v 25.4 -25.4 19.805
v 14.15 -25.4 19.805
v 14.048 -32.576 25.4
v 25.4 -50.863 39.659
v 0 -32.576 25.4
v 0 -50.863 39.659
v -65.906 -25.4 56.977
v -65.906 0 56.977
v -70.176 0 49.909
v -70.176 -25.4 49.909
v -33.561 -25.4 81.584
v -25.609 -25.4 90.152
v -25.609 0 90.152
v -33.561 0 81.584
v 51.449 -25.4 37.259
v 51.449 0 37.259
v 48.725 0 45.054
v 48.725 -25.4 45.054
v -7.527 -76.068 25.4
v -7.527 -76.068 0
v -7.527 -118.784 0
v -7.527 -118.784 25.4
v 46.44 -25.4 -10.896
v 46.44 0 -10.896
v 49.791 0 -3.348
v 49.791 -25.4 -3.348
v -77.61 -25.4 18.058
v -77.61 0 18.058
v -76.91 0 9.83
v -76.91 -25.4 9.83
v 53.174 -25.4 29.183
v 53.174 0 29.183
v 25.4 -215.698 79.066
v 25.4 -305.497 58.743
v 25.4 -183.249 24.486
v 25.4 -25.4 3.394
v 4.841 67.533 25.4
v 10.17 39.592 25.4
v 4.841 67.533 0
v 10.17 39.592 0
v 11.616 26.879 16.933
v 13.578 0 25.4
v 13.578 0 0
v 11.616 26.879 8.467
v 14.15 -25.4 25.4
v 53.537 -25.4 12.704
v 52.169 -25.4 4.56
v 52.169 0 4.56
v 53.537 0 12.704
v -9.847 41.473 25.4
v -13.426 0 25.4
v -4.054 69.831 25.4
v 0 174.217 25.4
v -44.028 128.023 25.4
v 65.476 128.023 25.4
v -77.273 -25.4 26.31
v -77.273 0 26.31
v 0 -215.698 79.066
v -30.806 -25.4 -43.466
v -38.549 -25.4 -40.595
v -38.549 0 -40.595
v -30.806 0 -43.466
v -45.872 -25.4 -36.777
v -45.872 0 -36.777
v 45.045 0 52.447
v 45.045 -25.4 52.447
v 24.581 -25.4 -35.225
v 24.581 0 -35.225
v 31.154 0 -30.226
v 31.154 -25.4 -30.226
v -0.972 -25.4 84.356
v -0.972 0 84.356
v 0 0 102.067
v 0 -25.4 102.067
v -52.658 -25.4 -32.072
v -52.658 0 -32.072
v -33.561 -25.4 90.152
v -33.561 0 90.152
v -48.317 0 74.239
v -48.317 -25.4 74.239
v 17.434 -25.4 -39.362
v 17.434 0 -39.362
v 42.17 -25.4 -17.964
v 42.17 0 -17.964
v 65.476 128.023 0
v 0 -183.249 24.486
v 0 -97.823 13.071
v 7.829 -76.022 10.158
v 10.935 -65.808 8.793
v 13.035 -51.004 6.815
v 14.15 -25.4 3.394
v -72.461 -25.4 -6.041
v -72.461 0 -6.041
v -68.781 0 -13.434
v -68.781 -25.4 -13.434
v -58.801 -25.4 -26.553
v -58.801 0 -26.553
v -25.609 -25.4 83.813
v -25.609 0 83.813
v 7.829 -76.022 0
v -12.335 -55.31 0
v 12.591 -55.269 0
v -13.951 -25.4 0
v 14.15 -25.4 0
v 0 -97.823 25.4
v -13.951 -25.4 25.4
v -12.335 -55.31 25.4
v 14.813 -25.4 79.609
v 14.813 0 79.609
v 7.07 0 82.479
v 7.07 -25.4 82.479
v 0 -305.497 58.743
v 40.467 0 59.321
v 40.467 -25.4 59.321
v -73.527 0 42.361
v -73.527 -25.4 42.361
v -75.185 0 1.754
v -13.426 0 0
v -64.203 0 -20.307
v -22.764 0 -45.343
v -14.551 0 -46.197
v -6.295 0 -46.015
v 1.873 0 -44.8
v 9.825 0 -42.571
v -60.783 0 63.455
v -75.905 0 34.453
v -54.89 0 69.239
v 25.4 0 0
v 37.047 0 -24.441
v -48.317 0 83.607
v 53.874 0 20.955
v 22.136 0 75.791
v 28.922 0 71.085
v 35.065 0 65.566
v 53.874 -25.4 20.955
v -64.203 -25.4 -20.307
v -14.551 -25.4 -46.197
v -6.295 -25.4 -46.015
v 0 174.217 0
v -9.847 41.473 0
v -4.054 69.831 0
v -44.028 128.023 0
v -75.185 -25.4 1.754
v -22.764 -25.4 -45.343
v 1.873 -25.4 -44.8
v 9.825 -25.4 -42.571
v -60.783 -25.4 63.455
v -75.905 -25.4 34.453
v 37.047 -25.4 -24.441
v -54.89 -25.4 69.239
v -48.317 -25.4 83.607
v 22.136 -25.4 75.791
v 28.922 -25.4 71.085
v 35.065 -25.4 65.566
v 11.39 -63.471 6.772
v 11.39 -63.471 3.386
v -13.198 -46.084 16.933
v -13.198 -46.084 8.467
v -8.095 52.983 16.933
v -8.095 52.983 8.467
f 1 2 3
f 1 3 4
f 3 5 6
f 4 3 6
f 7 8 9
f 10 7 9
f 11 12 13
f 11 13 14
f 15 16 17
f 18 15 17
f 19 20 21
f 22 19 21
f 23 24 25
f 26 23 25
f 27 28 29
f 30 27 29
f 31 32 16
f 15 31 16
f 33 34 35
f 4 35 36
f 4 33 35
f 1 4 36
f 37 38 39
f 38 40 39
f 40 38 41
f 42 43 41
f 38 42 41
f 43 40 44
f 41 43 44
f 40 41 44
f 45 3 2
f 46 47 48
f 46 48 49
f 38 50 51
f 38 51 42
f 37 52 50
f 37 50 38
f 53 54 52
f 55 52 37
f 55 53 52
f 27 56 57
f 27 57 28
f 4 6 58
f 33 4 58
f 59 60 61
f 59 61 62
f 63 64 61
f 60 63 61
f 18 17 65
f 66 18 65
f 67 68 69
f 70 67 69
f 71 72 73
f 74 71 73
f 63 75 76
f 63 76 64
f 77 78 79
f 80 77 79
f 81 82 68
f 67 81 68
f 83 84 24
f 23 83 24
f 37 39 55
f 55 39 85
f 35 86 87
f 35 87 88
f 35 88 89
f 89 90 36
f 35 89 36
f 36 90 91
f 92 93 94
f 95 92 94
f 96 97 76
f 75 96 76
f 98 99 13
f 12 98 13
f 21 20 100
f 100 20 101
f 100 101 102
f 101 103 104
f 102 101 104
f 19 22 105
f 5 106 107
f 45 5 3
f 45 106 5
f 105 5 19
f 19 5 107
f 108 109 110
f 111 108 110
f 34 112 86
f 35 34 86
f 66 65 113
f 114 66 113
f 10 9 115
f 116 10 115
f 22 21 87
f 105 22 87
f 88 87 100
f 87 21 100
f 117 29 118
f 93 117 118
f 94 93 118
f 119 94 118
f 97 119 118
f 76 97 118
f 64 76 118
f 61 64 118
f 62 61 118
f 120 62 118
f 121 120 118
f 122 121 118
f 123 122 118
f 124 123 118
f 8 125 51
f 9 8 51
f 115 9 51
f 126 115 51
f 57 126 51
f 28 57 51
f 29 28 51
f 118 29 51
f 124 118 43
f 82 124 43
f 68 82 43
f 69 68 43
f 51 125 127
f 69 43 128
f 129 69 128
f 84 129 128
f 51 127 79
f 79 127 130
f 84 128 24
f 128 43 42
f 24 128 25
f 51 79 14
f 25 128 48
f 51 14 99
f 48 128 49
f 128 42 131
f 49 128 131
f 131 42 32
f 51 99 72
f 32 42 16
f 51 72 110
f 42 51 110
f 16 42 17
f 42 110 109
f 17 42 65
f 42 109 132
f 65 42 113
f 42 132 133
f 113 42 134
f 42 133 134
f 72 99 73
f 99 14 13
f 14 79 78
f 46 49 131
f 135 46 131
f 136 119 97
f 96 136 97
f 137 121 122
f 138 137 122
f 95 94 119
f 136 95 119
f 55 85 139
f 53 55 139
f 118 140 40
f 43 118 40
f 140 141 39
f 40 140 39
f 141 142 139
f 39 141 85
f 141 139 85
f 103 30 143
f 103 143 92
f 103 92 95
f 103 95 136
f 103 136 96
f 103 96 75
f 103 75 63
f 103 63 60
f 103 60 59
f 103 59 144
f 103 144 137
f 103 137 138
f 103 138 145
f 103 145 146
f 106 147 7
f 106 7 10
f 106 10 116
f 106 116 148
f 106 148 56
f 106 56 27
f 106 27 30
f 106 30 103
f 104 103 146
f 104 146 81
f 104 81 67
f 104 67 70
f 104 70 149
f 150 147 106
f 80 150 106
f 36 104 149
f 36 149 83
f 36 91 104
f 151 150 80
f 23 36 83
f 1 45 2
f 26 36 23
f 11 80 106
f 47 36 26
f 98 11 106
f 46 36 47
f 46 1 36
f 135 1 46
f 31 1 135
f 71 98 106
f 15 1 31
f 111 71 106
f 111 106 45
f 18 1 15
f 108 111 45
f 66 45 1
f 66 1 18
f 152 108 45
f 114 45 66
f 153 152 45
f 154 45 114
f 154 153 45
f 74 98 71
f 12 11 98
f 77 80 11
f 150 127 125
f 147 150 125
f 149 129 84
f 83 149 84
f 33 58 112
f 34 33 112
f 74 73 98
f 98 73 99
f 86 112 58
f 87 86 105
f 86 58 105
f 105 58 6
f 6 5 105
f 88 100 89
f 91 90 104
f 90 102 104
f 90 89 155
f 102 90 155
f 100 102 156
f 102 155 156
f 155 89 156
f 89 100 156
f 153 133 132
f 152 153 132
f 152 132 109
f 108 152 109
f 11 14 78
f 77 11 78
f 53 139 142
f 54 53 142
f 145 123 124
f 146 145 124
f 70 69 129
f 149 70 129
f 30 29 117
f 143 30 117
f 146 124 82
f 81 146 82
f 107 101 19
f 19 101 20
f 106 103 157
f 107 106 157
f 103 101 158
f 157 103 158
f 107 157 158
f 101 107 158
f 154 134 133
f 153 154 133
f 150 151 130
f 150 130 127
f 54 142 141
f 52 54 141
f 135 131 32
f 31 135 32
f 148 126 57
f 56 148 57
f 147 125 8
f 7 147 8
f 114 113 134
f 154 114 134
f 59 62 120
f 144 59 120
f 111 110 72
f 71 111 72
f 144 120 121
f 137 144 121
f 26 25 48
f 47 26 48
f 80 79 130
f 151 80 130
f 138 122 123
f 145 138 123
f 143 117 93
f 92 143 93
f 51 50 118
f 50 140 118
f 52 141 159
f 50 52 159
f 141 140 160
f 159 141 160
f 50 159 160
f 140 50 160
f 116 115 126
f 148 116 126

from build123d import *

# Parameters (mm, degrees)
F1_DEPTH = 25.4
F3_DEPTH = 25.4
F5_DEPTH = 25.4


with BuildPart() as f1:
    # F0 (on Top) → F1 (new body)
    with BuildSketch(Plane.XY):
        with BuildLine():
            add(Edge.make_bspline(
                [(4.8407731435, 67.5330671062), (3.2844063816, 72.5791703322), (1.6407490349, 75.497781723), (0, 75.4938647151)],
                knots=[0.9332536986, 0.9332536986, 0.9332536986, 0.9332536986, 1, 1, 1, 1], degree=3))
            add(Edge.make_bspline(
                [(0, 75.4938647151), (-1.3704474219, 75.4905930061), (-2.7388658469, 73.4484060128), (-4.0536261968, 69.8308353891)],
                knots=[0, 0, 0, 0, 0.0557503279, 0.0557503279, 0.0557503279, 0.0557503279], degree=3))
            add(Edge.make_bspline(
                [(-4.0536261968, 69.8308353891), (-12.9127091312, 45.455018016), (-19.3355556664, -50.4479074799), (-7.5271204114, -76.0682523251)],
                knots=[0.0557503279, 0.0557503279, 0.0557503279, 0.0557503279, 0.4314056924, 0.4314056924, 0.4314056924, 0.4314056924], degree=3))
            add(Edge.make_bspline(
                [(-7.5271204114, -76.0682523251), (-3.2133106681, -85.4277729417), (3.5335683384, -85.4076795144), (7.8285336494, -76.0217905045)],
                knots=[0.4314056924, 0.4314056924, 0.4314056924, 0.4314056924, 0.5686385887, 0.5686385887, 0.5686385887, 0.5686385887], degree=3))
            add(Edge.make_bspline(
                [(7.8285336494, -76.0217905045), (19.2398591449, -51.0843517129), (13.3427399346, 39.9677122684), (4.8407731435, 67.5330671062)],
                knots=[0.5686385887, 0.5686385887, 0.5686385887, 0.5686385887, 0.9332536986, 0.9332536986, 0.9332536986, 0.9332536986], degree=3))
        make_face()
        with BuildLine():
            add(Edge.make_bspline(
                [(0, 75.4938647151), (-1.3704474219, 75.4905930061), (-2.7388658469, 73.4484060128), (-4.0536261968, 69.8308353891)],
                knots=[0, 0, 0, 0, 0.0557503279, 0.0557503279, 0.0557503279, 0.0557503279], degree=3))
            add(Edge.make_bspline(
                [(4.8407731435, 67.5330671062), (3.2844063816, 72.5791703322), (1.6407490349, 75.497781723), (0, 75.4938647151)],
                knots=[0.9332536986, 0.9332536986, 0.9332536986, 0.9332536986, 1, 1, 1, 1], degree=3))
            Line((4.8407731435, 67.5330671062), (10.3095113427, 128.0233865251))
            Line((10.3095113427, 128.0233865251), (-4.0536261968, 69.8308353891))
        make_face()
        Polygon((-44.0284609795, 128.0233865251), (-4.0536261968, 69.8308353891), (10.3095113427, 128.0233865251), align=None)
        Polygon((10.3095113427, 128.0233865251), (4.8407731435, 67.5330671062), (65.4755681753, 128.0233865251), align=None)
        with BuildLine():
            add(Edge.make_bspline(
                [(-7.5271204114, -76.0682523251), (-3.2133106681, -85.4277729417), (3.5335683384, -85.4076795144), (7.8285336494, -76.0217905045)],
                knots=[0.4314056924, 0.4314056924, 0.4314056924, 0.4314056924, 0.5686385887, 0.5686385887, 0.5686385887, 0.5686385887], degree=3))
            Line((-7.5271204114, -76.0682523251), (-7.5271204114, -118.7840104103))
            Line((-7.5271204114, -118.7840104103), (7.8285336494, -76.0217905045))
        make_face()
        Polygon((-44.0284609795, 128.0233865251), (10.3095113427, 128.0233865251), (65.4755681753, 128.0233865251), (0, 174.2165982723), align=None)
    extrude(amount=F1_DEPTH)

    # F2 (on Front) → F3 (join)
    with BuildSketch(Plane.XZ):
        Polygon((35.0647498421, 65.5660423193), (28.9218947291, 71.0850805044), (22.1357589616, 75.7906955304), (14.8133639544, 79.6086770372), (7.070188251, 82.4788131758), (-0.9716536423, 84.3558401847), (-9.1853370747, 85.2101562267), (-17.441327352, 85.0282882275), (-25.6094225756, 83.8131043541), (-33.5608070045, 81.583768782), (-41.1700825562, 78.375439465), (-48.3172464097, 74.2387136729), (-54.8895835217, 69.2388300428), (-60.7834442096, 63.4546397261), (-65.9058787697, 56.9773628595), (-70.1761033488, 49.9091499686), (-73.5267739546, 42.3614709929), (-75.9050485099, 34.4533573387), (-77.2734202043, 26.3095246824), (-77.6103089988, 18.0584061299), (-76.9104019558, 9.8301267496), (-75.1847370275, 1.7544514229), (-72.4605289807, -6.0412616263), (-68.7807402035, -13.4340693463), (-64.2034031634, -20.307382743), (-58.8007051997, -26.5528055582), (-52.6578500867, -32.0718437433), (-45.8717143191, -36.7774587693), (-38.5493193119, -40.5954402761), (-30.8061436085, -43.4655764147), (-22.7643017153, -45.3426034236), (-14.5506182828, -46.1969194657), (-6.2946280055, -46.0150514664), (1.8734672181, -44.799867593), (9.8248516469, -42.5705320209), (17.4341271986, -39.3622027039), (24.5812910522, -35.2254769118), (31.1536281641, -30.2255932817), (37.047488852, -24.441402965), (42.1699234121, -17.9641260984), (46.4401479913, -10.8959132075), (49.790818597, -3.3482342318), (52.1690931524, 4.5598794223), (53.5374648468, 12.7037120787), (53.8743536413, 20.9548306312), (53.1744465983, 29.1831100115), (51.4487816699, 37.2587853382), (48.7245736231, 45.0544983874), (45.044784846, 52.4473061074), (40.4674478058, 59.320619504), align=None)
        Polygon((-9.1853370747, 85.2101562267), (-0.9716536423, 84.3558401847), (0, 102.0670607686), (-25.6094225756, 83.8131043541), (-17.441327352, 85.0282882275), align=None)
        Polygon((-33.5608070045, 81.583768782), (-25.6094225756, 83.8131043541), (-25.6094225756, 90.1521965861), align=None)
        Polygon((-41.1700825562, 78.375439465), (-33.5608070045, 81.583768782), (-33.5608070045, 90.1521965861), (-48.3172464097, 74.2387136729), align=None)
        Polygon((-54.8895835217, 69.2388300428), (-48.3172464097, 74.2387136729), (-48.3172464097, 83.6073234677), align=None)
    extrude(amount=F3_DEPTH)

    # F4 (on Right) → F5 (join)
    with BuildSketch(Plane.YZ):
        Polygon((-305.4965734482, 58.7429665029), (-183.2486838102, 24.4857445359), (-215.6980782747, 79.0661200881), align=None)
        Polygon((-215.6980782747, 79.0661200881), (-183.2486838102, 24.4857445359), (0, 0), (-50.8633553982, 39.6590679884), align=None)
    extrude(amount=F5_DEPTH)


solid = f1.part
